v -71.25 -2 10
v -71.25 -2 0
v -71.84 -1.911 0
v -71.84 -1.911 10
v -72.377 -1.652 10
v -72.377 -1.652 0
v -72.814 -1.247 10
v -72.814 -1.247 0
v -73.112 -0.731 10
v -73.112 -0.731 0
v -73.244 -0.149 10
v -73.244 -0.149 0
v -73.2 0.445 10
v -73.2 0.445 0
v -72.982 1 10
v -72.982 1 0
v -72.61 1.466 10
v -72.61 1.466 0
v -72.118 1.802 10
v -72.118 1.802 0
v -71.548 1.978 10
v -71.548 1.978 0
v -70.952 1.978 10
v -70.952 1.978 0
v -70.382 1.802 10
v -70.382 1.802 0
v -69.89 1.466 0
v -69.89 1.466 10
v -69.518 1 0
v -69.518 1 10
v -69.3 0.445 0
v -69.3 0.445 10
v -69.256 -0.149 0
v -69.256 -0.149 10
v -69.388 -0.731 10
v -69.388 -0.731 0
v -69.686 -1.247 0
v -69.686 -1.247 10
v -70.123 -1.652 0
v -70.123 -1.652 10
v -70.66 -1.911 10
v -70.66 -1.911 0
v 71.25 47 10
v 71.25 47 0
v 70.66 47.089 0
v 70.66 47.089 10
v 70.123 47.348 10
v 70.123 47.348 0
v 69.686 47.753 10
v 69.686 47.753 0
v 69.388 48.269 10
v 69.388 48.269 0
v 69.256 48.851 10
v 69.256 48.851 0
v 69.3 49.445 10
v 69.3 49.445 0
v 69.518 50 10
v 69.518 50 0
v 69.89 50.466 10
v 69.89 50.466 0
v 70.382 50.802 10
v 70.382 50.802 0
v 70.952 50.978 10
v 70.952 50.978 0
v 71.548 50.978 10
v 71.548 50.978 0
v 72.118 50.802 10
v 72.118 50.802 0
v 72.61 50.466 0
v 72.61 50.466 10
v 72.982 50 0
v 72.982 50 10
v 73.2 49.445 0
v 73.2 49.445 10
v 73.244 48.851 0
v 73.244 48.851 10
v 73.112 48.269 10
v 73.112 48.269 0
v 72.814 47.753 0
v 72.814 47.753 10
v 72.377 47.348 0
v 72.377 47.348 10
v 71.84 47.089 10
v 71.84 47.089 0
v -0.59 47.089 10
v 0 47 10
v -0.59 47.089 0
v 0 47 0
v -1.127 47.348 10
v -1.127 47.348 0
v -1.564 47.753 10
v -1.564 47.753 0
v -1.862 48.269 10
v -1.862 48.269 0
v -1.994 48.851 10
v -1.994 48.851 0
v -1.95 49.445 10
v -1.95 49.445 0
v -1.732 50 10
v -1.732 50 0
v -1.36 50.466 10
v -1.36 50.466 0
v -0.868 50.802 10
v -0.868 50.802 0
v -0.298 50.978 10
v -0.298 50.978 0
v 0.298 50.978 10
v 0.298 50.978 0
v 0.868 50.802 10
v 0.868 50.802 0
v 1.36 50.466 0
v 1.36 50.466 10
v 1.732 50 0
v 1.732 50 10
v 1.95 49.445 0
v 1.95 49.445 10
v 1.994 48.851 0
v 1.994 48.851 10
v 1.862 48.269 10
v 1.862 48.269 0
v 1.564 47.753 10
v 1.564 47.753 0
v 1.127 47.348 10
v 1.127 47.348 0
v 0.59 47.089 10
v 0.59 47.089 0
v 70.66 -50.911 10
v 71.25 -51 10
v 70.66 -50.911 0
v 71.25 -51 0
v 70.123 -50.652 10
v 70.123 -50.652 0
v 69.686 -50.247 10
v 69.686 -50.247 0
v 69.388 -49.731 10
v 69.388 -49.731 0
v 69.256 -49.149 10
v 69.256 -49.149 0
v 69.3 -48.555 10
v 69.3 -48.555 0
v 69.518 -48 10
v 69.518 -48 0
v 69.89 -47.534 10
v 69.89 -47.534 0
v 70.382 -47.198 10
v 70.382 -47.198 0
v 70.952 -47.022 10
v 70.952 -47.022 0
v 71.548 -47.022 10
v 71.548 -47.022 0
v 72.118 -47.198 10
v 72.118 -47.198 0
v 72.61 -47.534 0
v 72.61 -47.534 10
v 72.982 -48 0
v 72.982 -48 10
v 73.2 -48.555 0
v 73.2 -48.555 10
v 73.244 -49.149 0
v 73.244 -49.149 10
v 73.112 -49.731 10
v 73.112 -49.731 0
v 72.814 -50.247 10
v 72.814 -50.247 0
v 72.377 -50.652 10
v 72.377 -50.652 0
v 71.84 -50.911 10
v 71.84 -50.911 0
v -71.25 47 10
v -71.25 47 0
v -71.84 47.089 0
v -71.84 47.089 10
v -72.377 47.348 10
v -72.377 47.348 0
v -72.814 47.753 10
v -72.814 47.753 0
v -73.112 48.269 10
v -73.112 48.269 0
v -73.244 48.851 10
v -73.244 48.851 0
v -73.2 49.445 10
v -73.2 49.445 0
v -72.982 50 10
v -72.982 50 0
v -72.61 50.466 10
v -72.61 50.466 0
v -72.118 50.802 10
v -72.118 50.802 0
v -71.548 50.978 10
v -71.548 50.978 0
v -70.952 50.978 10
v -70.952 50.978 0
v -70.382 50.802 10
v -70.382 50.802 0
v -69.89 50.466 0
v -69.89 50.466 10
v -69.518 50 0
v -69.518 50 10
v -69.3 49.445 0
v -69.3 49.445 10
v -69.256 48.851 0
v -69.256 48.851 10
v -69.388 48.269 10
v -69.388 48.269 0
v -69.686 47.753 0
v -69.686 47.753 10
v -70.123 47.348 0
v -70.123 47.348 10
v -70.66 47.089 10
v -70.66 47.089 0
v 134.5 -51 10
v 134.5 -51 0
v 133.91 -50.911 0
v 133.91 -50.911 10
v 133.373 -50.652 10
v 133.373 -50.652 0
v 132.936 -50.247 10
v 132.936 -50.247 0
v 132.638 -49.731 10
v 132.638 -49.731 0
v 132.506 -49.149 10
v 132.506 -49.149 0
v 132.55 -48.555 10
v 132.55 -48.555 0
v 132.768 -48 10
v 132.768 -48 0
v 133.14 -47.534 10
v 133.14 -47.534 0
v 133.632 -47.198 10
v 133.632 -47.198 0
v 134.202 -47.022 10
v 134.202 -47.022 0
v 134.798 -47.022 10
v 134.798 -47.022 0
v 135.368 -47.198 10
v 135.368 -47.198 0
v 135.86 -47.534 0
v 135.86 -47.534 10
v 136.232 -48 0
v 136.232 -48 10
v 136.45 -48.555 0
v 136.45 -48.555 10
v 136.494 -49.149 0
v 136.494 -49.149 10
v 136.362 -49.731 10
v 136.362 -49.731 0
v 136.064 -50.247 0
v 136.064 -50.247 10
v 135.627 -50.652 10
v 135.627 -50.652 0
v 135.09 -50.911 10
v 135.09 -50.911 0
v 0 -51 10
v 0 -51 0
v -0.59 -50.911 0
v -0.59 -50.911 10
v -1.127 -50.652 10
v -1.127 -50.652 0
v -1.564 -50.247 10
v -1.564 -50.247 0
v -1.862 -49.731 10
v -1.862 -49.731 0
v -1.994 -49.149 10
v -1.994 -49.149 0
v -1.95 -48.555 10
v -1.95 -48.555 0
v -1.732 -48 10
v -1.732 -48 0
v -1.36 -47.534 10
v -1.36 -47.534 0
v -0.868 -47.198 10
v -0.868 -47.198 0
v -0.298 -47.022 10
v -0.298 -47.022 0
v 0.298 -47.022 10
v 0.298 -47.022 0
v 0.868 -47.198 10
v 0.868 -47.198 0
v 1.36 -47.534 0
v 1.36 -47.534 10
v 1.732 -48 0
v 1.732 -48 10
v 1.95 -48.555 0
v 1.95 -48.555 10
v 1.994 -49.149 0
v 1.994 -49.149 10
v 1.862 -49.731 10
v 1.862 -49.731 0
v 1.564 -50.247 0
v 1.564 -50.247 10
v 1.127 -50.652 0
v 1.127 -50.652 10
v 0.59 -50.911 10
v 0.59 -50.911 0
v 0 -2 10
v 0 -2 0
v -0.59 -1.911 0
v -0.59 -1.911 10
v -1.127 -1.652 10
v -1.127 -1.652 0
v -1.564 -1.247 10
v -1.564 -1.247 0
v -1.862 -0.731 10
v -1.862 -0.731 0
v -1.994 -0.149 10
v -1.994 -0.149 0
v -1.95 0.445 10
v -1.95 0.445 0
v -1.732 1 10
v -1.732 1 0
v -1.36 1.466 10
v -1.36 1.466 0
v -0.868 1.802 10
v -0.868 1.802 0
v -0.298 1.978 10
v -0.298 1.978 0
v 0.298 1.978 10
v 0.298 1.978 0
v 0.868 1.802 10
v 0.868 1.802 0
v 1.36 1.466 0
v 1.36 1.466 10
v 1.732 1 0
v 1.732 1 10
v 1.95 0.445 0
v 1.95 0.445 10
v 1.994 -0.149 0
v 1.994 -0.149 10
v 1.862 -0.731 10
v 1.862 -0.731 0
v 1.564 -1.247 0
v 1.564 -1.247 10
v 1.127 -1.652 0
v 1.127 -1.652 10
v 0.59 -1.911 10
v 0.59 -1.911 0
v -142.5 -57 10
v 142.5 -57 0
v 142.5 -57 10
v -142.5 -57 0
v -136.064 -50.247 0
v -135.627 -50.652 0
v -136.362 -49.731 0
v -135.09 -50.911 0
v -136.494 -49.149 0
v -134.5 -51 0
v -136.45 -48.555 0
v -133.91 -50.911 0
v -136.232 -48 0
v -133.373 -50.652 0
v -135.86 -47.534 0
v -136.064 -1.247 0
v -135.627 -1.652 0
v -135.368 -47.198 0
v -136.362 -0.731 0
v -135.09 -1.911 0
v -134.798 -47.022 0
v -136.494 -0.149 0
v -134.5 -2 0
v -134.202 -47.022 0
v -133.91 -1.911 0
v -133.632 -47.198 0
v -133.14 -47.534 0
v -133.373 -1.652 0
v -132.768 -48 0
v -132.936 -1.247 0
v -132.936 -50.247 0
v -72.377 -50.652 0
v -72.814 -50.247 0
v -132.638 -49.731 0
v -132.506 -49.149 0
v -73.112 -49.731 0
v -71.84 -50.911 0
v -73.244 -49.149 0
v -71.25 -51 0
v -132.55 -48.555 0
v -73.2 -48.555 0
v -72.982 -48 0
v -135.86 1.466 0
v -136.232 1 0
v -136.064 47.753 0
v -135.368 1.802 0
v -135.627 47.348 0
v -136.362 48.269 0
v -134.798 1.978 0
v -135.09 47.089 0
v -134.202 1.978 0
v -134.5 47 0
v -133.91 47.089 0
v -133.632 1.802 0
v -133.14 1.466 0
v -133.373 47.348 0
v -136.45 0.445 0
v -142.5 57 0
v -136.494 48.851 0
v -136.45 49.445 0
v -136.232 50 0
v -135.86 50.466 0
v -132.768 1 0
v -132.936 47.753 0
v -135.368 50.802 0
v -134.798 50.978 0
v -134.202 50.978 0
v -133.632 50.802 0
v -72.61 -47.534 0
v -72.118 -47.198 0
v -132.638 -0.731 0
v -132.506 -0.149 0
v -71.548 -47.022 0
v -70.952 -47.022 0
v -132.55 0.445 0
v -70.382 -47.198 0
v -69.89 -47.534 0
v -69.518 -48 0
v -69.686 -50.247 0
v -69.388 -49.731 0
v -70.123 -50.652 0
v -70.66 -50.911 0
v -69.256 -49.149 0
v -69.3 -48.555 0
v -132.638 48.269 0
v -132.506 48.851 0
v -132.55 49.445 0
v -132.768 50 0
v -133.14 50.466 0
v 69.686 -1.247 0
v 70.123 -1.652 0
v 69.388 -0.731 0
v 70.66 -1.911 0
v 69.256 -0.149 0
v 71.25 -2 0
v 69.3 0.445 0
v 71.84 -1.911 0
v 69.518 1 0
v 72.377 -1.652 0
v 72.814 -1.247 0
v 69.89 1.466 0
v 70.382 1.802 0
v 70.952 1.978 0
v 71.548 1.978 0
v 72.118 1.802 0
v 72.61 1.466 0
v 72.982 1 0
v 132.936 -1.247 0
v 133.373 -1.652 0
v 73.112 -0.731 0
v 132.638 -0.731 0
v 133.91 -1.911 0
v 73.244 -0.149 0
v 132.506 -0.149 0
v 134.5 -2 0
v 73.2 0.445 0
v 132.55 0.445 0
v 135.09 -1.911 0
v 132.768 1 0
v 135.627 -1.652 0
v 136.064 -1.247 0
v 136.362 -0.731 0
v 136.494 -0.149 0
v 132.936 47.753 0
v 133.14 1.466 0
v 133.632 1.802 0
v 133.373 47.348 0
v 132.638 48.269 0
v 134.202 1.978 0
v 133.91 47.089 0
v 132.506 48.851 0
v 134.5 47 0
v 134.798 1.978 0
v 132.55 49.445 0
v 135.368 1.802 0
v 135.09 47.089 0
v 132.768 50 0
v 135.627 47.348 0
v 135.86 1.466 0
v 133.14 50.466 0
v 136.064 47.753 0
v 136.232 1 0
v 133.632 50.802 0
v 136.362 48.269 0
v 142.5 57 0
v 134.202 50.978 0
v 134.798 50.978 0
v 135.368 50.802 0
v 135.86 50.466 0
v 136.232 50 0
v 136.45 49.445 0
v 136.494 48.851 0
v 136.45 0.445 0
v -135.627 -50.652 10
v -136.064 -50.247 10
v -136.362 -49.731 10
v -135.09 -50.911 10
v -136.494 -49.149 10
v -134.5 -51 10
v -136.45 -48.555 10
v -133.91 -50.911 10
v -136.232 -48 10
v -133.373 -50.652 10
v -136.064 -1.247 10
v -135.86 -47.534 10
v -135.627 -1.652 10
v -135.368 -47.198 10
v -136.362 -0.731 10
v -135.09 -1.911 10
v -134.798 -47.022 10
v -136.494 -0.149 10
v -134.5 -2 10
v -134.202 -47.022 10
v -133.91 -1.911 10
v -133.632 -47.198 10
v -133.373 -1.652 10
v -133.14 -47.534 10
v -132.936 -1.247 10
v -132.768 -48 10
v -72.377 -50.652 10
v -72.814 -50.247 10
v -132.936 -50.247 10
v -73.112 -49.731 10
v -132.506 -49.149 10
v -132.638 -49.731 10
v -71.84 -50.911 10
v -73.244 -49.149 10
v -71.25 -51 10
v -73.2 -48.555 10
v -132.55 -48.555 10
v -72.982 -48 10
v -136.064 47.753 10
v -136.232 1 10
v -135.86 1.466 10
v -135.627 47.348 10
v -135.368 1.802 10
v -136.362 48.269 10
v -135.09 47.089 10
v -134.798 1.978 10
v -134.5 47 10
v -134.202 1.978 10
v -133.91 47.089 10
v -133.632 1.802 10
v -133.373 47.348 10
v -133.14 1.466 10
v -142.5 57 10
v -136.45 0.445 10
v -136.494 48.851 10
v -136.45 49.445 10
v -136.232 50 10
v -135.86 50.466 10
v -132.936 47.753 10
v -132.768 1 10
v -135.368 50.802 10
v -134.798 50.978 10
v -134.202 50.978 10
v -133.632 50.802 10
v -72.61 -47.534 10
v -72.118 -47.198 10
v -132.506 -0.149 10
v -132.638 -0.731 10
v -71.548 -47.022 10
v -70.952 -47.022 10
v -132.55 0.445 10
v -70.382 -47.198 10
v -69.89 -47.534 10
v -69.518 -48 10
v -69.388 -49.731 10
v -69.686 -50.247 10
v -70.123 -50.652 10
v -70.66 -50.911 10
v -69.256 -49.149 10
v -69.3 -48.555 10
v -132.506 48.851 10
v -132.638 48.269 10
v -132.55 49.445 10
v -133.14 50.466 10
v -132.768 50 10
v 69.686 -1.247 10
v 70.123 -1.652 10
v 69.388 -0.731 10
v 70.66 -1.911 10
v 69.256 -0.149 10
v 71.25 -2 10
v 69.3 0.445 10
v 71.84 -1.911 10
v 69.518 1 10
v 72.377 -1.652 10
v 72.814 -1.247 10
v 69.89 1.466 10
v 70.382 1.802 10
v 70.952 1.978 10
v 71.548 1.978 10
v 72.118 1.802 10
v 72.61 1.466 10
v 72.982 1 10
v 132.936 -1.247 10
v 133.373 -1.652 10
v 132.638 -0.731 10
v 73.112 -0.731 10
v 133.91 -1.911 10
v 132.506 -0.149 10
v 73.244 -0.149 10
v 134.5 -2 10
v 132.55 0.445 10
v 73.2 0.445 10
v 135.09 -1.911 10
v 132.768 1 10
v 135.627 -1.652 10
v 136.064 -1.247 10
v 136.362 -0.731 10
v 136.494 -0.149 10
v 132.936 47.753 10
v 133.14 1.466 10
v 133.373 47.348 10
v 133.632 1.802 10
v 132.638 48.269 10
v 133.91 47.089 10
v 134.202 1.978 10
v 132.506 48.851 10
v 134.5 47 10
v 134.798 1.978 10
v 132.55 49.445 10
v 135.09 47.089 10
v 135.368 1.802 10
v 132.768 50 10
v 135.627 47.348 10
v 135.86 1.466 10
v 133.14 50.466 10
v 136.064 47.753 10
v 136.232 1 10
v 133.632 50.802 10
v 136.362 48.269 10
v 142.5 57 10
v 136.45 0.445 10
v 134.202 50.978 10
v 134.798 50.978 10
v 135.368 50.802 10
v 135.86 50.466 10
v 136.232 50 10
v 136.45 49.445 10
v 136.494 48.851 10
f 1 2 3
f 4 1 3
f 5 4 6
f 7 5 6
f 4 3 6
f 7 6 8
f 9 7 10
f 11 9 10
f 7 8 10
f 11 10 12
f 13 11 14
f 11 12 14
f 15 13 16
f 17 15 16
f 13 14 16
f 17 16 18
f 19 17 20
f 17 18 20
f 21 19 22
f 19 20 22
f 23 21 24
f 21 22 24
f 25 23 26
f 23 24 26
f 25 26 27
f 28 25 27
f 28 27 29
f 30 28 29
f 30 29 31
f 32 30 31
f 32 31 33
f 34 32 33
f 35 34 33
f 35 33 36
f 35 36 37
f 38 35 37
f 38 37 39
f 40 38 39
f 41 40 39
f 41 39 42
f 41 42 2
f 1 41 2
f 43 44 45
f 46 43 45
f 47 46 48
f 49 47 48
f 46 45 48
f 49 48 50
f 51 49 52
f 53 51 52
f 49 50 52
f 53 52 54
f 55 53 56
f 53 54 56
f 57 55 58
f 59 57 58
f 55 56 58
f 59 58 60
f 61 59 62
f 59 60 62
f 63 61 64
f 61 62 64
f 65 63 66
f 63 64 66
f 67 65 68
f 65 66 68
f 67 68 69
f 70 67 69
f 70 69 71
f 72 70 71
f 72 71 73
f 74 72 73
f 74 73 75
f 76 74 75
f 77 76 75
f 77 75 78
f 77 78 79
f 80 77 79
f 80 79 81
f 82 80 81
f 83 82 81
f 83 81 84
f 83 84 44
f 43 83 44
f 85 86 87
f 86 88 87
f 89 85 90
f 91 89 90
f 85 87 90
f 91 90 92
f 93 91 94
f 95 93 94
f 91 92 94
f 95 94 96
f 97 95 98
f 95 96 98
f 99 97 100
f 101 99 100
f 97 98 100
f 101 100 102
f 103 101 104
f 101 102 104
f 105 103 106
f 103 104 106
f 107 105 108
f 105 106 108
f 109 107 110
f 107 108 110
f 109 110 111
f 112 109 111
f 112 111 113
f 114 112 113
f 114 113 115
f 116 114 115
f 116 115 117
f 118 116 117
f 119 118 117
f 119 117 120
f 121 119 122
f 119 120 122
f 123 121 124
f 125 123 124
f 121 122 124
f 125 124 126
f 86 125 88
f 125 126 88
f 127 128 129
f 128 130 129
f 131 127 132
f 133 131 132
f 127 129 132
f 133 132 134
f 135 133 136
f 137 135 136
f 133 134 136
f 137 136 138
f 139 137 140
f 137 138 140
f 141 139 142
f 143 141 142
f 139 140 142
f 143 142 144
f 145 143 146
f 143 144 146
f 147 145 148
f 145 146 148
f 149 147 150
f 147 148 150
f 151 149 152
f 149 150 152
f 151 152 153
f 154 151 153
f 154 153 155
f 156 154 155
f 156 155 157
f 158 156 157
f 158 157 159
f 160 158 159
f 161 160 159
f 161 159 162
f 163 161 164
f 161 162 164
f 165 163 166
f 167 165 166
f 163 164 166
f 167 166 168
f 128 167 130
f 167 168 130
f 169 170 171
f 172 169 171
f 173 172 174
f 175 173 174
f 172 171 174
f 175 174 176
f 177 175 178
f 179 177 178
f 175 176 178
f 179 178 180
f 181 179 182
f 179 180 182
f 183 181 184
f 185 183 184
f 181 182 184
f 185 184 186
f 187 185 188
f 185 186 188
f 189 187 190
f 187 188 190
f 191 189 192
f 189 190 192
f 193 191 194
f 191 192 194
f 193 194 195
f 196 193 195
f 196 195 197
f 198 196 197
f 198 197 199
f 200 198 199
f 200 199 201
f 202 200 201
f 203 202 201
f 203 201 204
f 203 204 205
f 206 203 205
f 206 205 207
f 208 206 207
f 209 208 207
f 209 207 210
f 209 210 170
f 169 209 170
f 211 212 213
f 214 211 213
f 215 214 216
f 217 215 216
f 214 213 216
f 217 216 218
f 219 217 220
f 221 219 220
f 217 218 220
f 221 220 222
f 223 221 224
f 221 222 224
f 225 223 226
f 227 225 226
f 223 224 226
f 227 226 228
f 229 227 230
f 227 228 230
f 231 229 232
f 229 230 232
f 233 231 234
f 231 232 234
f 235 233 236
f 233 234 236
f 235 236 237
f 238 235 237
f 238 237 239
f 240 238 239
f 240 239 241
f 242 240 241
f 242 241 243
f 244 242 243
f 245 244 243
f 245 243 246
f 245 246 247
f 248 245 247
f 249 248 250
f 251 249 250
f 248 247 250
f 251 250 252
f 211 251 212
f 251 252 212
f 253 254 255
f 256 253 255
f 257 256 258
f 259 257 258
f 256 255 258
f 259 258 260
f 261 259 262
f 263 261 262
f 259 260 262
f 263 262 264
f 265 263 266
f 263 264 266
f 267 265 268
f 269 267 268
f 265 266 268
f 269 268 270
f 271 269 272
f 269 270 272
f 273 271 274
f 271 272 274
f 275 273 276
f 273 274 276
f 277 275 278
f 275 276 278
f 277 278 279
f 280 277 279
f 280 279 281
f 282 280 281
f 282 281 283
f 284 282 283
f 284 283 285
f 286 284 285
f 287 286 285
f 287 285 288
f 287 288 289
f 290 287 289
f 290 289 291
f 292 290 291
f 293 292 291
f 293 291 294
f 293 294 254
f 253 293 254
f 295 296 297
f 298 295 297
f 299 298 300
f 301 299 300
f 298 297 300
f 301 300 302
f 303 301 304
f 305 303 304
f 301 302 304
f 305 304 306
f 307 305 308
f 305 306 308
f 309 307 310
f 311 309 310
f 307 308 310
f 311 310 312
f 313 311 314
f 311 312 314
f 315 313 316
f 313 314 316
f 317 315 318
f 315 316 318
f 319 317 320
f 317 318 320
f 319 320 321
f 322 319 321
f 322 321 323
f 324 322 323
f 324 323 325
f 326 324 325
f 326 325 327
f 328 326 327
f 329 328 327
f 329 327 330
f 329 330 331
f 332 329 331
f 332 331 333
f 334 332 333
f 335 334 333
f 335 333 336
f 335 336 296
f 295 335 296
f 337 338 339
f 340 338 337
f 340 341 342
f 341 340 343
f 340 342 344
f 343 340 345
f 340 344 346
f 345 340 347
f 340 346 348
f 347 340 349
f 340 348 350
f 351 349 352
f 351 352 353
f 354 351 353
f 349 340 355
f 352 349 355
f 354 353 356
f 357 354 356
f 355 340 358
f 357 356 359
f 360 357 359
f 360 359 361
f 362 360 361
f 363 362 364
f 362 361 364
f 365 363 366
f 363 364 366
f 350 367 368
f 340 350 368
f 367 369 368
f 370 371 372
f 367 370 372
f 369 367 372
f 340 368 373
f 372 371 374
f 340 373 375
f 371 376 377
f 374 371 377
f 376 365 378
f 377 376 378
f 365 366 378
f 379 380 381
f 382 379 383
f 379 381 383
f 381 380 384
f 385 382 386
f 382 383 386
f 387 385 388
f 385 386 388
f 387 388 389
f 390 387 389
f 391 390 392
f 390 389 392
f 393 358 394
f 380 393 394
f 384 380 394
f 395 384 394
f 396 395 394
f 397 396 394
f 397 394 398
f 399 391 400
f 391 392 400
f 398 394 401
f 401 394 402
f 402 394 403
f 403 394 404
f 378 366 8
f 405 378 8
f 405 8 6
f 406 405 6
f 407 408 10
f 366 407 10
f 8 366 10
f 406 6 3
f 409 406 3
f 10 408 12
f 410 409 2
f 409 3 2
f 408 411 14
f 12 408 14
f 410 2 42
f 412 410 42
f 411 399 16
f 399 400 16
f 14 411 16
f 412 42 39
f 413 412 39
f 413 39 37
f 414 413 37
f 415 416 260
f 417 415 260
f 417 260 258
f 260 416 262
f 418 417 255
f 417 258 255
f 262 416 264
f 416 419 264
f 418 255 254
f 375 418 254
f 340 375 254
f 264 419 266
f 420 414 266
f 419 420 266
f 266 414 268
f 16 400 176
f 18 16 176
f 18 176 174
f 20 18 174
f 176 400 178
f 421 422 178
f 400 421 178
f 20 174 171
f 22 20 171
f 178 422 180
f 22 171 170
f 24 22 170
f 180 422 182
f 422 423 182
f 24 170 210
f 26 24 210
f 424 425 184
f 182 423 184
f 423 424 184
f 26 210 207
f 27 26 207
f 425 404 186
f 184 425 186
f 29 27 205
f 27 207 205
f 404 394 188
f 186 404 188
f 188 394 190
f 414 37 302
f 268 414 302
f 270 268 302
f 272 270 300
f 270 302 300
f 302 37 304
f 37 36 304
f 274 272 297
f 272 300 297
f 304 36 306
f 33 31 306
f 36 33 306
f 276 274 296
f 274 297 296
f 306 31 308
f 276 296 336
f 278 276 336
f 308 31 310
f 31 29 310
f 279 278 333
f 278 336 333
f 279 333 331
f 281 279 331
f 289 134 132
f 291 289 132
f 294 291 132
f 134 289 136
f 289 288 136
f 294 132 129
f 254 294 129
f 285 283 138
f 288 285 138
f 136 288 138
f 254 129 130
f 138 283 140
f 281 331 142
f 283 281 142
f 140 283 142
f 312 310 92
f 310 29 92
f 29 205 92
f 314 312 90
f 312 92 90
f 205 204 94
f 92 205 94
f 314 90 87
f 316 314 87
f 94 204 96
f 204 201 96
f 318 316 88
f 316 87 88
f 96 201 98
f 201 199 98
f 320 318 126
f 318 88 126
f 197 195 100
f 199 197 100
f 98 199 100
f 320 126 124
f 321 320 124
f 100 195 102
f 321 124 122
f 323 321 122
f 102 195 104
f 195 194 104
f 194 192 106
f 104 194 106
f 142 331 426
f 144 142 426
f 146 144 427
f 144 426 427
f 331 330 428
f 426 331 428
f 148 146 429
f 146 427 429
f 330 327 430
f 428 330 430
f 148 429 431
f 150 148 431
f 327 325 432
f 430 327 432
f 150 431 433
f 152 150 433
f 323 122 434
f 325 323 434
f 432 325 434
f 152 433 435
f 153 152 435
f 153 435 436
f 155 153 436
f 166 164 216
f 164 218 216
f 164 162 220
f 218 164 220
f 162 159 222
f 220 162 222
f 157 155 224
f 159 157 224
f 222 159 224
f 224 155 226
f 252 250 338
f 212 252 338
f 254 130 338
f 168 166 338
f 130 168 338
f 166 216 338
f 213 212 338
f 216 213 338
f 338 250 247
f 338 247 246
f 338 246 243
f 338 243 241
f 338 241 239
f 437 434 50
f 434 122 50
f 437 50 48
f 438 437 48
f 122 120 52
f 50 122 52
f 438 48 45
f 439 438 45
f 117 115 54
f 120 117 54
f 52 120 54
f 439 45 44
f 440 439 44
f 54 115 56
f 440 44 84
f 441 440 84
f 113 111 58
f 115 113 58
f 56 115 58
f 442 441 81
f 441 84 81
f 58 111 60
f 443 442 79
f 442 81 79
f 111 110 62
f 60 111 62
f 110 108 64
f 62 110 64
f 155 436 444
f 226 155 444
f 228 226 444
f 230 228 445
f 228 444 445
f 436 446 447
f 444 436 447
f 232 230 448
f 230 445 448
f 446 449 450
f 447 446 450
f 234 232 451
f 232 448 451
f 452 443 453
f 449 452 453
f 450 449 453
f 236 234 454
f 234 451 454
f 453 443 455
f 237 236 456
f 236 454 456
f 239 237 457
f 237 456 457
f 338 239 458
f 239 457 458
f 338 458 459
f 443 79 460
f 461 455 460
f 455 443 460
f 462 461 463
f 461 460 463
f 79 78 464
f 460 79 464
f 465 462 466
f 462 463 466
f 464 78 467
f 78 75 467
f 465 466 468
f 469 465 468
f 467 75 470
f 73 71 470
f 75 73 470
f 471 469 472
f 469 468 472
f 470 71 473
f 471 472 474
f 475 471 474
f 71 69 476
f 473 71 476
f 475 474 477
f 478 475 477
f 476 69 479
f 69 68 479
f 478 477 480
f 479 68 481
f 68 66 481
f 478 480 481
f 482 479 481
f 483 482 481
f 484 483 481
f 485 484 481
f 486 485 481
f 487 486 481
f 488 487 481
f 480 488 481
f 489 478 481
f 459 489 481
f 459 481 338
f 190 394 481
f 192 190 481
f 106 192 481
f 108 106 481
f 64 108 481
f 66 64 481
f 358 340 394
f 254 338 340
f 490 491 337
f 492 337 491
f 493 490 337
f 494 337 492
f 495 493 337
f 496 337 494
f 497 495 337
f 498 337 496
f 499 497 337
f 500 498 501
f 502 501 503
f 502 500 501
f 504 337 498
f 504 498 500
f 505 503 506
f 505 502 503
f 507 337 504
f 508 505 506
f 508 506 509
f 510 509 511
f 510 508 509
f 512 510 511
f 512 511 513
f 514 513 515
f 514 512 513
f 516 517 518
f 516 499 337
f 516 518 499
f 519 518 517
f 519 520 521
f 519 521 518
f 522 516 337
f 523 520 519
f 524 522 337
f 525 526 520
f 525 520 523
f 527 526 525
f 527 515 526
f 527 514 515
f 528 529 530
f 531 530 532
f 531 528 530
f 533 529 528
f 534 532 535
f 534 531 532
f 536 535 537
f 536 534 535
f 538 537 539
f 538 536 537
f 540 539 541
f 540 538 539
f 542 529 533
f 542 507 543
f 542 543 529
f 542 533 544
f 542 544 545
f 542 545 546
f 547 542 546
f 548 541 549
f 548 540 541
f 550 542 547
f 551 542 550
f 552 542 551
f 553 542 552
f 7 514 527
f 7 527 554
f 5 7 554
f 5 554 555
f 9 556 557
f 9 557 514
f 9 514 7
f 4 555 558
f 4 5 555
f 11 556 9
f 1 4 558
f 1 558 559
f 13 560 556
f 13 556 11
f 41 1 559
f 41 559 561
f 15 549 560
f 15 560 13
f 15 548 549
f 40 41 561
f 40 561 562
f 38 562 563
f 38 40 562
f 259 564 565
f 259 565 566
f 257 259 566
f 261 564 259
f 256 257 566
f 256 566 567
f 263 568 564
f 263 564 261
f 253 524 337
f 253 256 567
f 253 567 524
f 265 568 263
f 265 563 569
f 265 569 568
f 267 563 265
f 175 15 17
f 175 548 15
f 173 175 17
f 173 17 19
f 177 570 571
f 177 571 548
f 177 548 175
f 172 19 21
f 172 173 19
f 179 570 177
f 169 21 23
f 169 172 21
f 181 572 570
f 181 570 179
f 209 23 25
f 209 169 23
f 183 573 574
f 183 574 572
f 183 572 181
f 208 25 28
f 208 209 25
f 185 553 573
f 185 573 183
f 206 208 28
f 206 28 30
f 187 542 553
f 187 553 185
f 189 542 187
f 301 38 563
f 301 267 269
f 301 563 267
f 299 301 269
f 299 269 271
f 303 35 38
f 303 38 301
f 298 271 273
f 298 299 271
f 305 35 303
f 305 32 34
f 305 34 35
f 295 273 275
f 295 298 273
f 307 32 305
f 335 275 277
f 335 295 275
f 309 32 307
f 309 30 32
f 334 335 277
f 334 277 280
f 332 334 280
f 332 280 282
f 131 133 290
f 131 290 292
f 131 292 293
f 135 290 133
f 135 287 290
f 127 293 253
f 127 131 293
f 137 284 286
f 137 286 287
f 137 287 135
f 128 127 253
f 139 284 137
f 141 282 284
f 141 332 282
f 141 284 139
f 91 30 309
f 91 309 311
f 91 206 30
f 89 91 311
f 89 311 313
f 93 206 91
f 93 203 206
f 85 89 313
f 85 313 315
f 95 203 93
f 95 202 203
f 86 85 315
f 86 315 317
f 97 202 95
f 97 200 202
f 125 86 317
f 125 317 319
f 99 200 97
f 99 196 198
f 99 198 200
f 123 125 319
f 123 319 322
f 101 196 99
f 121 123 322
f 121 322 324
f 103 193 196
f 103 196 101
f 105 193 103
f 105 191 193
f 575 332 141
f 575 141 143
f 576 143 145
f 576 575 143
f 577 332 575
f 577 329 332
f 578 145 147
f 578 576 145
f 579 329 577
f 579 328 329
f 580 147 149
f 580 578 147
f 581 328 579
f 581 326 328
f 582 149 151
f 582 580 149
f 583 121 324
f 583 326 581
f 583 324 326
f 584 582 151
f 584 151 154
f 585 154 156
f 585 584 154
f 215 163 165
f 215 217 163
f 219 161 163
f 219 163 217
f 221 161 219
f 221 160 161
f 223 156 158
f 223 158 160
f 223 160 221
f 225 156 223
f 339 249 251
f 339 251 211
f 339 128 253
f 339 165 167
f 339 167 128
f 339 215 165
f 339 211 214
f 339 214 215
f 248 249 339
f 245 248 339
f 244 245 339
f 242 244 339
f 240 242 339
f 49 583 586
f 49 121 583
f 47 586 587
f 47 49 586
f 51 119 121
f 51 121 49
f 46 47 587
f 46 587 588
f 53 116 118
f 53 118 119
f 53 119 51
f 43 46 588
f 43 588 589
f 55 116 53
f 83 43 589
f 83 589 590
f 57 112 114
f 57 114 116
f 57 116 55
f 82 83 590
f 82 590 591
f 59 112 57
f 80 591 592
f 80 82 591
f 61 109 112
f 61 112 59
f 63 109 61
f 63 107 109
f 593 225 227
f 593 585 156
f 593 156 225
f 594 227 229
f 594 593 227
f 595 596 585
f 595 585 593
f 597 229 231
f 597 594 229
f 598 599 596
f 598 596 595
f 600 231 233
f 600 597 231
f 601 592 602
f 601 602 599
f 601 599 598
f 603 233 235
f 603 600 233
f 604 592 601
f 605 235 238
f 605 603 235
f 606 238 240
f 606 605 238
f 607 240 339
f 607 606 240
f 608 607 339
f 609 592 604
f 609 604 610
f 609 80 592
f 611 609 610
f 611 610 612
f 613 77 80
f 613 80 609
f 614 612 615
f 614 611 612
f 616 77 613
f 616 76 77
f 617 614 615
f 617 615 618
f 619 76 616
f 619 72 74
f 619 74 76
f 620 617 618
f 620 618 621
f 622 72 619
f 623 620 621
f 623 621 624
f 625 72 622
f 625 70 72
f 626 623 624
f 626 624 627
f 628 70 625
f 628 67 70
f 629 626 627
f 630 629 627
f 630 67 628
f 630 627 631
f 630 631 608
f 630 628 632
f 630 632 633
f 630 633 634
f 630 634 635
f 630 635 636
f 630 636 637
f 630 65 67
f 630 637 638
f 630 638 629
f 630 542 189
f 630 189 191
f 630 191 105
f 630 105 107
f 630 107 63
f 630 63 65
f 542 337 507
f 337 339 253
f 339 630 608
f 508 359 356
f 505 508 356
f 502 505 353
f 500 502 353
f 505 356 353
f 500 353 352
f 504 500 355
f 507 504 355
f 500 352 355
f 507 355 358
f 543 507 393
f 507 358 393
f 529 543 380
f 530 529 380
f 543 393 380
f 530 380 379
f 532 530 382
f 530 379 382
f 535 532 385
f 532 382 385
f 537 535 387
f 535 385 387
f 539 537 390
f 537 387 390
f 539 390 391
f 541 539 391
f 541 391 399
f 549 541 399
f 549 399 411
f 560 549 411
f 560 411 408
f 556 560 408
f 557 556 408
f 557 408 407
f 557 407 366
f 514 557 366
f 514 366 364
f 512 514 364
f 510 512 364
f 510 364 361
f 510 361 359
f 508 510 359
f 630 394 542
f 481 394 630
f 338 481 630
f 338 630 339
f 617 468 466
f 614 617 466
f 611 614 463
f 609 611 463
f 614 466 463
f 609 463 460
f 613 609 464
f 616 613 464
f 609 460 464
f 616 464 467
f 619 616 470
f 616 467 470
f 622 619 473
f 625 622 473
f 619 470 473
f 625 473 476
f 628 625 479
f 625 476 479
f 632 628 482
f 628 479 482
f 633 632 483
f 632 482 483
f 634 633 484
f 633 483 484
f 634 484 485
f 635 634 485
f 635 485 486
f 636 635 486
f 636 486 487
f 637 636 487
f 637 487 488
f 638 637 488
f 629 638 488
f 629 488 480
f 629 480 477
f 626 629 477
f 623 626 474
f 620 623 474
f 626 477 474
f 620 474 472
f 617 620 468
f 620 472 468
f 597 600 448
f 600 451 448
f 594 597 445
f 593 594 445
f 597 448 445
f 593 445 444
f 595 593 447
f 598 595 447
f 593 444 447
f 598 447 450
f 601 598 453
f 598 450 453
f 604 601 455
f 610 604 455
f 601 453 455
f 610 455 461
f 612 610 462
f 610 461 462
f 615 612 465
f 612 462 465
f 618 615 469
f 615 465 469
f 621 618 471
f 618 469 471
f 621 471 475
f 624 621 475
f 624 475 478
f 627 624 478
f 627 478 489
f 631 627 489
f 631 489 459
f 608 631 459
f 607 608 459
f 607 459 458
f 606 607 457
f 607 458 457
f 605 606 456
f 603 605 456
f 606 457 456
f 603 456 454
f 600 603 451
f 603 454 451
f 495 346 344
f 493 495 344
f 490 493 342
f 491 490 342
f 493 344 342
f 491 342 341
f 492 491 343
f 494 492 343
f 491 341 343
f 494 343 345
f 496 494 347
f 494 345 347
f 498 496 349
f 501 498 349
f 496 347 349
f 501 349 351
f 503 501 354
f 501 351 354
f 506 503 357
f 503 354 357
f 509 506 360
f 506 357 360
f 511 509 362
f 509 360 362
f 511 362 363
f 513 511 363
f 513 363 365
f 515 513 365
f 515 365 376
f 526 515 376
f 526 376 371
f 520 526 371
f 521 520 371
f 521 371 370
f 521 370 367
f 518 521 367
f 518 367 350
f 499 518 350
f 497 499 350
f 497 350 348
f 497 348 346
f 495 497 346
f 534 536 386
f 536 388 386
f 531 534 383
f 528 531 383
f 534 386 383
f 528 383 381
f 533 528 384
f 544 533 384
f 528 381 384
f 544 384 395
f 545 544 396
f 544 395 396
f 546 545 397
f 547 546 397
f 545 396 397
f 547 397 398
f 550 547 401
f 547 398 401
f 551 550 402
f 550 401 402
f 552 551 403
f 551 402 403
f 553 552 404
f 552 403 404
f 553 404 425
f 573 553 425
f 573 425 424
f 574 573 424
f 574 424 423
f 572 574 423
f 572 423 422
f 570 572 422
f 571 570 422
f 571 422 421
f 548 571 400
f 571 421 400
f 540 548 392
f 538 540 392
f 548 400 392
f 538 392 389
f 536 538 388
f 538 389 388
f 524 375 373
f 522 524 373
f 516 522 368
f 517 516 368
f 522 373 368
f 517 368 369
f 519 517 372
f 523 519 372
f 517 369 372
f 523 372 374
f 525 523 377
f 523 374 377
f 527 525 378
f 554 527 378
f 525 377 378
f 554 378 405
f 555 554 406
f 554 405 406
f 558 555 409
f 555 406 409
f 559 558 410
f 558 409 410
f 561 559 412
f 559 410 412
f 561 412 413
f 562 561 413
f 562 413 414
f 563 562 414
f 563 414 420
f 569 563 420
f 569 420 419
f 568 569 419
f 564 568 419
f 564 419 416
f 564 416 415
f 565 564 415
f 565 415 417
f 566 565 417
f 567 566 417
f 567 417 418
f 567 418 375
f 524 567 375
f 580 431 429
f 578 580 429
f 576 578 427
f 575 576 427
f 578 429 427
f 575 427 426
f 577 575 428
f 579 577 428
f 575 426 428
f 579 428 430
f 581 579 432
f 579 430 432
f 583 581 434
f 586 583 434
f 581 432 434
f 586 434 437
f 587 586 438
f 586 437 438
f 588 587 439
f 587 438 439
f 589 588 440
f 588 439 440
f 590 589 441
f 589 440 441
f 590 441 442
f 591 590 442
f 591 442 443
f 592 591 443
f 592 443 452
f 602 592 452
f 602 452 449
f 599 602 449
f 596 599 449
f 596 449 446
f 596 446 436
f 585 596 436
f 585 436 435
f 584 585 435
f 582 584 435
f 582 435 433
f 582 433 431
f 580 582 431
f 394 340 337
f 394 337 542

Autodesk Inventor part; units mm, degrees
ref_plane "YZ Plane" through (0, 0, 0) normal (1, 0, 0) x (0, 1, 0)
ref_plane "XZ Plane" through (0, 0, 0) normal (0, 1, 0) x (-1, 0, 0)
ref_plane "XY Plane" through (0, 0, 0) normal (0, 0, 1) x (1, 0, 0)
sketch "Sketch1" plane through (0, 0, 0) normal (0, 0, 1) x (1, 0, 0)
  line L0 (-142.5, 57) -> (142.5, 57)
  line L1 (142.5, 57) -> (142.5, -57)
  line L2 (142.5, -57) -> (-142.5, -57)
  line L3 (-142.5, -57) -> (-142.5, 57)
  point P0 (0, 0)
  dimension "d0" = 114
  dimension "d1" = 285
  dimension "d2" = 57
  dimension "d3" = 142.5
extrude "Extrusion1" add sketch "Sketch1" along normal blind 10
sketch "Sketch2" plane through (0, 0, 10) normal (0, 0, 1) x (1, 0, 0)
  line L0 (142.5, 57) -> (-142.5, 57) projected
  line L1 (-142.5, 57) -> (-142.5, -57) projected
  line L2 (-142.5, -57) -> (142.5, -57) projected
  line L3 (142.5, -57) -> (142.5, 57) projected
  point P0 (0, 0)
  point P1 (-134.5, 49)
  point P2 (-134.5, -49)
  point P3 (134.5, -49)
  point P4 (134.5, 49)
  point P5 (71.25, 49)
  point P6 (-71.25, 49)
  point P7 (-71.25, -49)
  point P8 (71.25, -49)
  point P9 (-71.25, 0)
  point P10 (0, 0)
  point P11 (71.25, 0)
  point P12 (0, 49)
  point P13 (0, -49)
  point P14 (-134.5, 0)
  point P15 (134.5, 0)
  dimension "d6" = 8
  dimension "d7" = 8
  dimension "d8" = 8
  dimension "d9" = 8
  dimension "d13" = 71.25
  dimension "d14" = 71.25
  dimension "d15" = 71.25
  dimension "d16" = 71.25
hole "Hole1" at (-134.5, 49, 10) at (-134.5, -49, 10) at (134.5, -49, 10) at (134.5, 49, 10) at (71.25, 49, 10) at (-71.25, 49, 10) at (-71.25, -49, 10) at (71.25, -49, 10) at (-71.25, 0, 10) at (0, 0, 10) at (71.25, 0, 10) at (0, 49, 10) at (0, -49, 10) at (-134.5, 0, 10) at (134.5, 0, 10) direction (0, 0, -1) diameter 4 end through all
equation "\"d2\" = 0.5 * d0"
equation "\"d3\" = 0.5 * d1"
equation "\"d13\" = d14"
equation "\"d15\" = d14"
properties part number "CNC Assembly" material "PET Plastic"
